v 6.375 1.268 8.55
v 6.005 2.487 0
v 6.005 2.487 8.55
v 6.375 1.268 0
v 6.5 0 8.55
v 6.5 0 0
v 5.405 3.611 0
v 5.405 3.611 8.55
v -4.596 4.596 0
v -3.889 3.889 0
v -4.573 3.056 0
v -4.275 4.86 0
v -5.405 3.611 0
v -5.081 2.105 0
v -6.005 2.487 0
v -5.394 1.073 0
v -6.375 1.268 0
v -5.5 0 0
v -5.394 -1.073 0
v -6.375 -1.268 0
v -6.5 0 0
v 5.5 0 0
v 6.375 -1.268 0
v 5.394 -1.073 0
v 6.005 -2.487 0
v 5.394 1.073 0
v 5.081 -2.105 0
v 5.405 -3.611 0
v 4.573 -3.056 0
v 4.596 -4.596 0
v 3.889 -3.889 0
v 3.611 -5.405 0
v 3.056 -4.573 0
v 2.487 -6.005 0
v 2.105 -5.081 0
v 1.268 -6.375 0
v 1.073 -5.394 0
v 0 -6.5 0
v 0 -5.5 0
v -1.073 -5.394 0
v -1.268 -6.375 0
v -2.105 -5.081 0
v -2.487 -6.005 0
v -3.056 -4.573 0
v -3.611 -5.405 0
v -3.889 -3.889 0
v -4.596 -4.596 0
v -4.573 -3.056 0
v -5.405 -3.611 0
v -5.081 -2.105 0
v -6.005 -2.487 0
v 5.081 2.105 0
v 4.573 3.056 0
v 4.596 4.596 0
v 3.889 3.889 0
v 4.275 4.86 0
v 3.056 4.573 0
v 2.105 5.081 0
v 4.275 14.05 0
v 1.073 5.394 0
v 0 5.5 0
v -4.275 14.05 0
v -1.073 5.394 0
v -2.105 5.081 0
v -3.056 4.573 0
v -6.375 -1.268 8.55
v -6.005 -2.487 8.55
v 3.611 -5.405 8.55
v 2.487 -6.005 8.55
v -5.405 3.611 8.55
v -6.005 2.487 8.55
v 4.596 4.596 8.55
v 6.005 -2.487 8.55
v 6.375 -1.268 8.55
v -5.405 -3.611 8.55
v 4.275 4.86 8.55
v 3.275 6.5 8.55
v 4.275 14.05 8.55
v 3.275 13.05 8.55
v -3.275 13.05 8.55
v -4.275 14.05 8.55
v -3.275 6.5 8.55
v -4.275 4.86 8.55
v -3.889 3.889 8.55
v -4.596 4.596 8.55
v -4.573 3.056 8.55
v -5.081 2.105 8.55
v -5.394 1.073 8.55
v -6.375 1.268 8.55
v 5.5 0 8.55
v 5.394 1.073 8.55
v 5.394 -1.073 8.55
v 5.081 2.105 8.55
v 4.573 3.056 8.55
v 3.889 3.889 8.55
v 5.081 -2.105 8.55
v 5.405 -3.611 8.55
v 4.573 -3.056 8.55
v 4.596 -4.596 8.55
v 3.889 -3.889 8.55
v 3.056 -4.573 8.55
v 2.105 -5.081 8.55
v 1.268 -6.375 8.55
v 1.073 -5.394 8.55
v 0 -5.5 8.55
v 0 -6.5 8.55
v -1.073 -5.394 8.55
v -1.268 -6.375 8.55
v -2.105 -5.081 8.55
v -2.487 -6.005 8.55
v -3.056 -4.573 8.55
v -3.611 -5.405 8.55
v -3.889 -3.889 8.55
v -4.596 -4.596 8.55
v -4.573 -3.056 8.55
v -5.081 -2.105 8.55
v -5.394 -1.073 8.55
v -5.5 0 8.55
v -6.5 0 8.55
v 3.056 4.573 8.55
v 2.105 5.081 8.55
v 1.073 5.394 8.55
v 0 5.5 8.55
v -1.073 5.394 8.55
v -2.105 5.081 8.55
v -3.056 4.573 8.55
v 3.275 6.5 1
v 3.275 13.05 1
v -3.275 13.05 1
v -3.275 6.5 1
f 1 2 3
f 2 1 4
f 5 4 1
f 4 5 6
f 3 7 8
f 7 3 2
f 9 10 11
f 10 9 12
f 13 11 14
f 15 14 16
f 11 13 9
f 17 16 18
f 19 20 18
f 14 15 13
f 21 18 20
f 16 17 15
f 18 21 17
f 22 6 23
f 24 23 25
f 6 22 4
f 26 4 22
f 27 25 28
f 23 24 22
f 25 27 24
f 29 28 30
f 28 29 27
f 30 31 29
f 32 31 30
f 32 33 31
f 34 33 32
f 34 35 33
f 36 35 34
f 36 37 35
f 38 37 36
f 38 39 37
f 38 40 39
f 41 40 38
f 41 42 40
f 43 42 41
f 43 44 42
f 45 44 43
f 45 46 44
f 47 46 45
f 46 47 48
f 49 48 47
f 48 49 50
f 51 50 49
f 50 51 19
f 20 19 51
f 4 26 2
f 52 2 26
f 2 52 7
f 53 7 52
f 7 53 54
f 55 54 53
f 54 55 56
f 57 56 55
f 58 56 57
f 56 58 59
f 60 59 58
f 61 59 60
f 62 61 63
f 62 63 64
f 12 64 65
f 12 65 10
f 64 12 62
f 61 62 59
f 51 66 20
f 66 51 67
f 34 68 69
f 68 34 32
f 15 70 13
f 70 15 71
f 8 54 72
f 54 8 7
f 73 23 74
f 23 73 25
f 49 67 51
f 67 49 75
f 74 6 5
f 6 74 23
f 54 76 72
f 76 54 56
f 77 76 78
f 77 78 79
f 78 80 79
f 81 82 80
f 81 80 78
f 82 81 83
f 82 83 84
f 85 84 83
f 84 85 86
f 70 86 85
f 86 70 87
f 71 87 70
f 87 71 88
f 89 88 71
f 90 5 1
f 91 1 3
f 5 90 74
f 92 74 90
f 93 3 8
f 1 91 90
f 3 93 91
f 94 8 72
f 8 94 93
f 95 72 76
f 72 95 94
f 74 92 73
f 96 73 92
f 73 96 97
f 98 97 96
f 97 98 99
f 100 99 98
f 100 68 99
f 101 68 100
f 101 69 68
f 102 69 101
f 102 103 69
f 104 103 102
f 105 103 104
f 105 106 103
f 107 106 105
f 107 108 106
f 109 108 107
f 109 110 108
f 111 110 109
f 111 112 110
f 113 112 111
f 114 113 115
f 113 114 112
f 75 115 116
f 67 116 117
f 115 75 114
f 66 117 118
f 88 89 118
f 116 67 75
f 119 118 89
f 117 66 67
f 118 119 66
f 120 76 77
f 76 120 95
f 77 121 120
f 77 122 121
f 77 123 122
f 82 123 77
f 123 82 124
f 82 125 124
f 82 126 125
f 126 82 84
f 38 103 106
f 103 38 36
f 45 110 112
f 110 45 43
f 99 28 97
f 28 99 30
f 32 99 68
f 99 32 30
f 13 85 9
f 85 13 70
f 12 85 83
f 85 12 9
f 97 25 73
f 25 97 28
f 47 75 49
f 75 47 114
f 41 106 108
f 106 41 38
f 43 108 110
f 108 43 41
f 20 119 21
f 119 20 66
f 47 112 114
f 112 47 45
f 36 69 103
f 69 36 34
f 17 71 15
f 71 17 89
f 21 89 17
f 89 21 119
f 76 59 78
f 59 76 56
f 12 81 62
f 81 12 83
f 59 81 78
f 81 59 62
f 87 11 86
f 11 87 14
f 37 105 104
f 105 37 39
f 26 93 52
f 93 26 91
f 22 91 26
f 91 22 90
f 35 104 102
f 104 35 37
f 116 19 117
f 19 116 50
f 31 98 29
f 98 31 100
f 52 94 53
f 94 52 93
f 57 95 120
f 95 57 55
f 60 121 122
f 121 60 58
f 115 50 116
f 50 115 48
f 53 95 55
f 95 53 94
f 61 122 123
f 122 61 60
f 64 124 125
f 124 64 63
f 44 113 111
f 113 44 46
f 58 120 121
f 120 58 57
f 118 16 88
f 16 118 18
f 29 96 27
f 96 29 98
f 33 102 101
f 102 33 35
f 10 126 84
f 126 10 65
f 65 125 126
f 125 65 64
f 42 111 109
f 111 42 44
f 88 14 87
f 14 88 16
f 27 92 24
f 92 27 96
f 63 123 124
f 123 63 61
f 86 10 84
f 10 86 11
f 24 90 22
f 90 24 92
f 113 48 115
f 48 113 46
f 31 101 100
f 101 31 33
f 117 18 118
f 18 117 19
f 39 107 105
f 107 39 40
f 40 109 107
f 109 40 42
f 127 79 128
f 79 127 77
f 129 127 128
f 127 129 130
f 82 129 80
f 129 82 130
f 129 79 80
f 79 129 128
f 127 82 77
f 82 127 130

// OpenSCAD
// [FL_INDEX: keywords="openscad, 3d_parametric, Magnetic_Marker_Holder, csg_solid" | COT="Parametric OpenSCAD design from 3DCodeverse"]
// Title: Magnetic Marker Holder

// author: clayb.rpi@gmail.com
// date: 2013-01-27
// units: mm
//
// description: A small plastic piece to hold a magnet cube
//   and a whiteboard marker together.

// The diameter (mm) of the pen to hold. This should be a tight fit.
PEN_DIAMETER = 11;

// The side length (mm) of the magnet cube (assumed to be equal on all sides).
MAGNET_CUBE_SIZE = 6.55;

// The minimum wall thickness (mm).
MIN_WALL_THICKNESS = 1;

// How detailed the print should be.
$fn=32 + 0; // the '+ 0' prevents customizer from displaying this variable.

// The main unit of height
TOTAL_H =  MAGNET_CUBE_SIZE + 2 * MIN_WALL_THICKNESS;

difference() {
  union() {
  	cylinder(r=PEN_DIAMETER/2 + MIN_WALL_THICKNESS, h=MAGNET_CUBE_SIZE + 2 * MIN_WALL_THICKNESS);

    translate([-TOTAL_H / 2, 0, 0])
    cube([TOTAL_H, PEN_DIAMETER / 2 + TOTAL_H, TOTAL_H]);
  }

  // cut away a place for the pen.
  translate([0, 0, -1])
	cylinder(r=PEN_DIAMETER/2, h=MAGNET_CUBE_SIZE + 2 * MIN_WALL_THICKNESS + 2);

  // cut away a place for the magnet.
  translate([-MAGNET_CUBE_SIZE / 2, PEN_DIAMETER /2 + MIN_WALL_THICKNESS, MIN_WALL_THICKNESS])
  cube([MAGNET_CUBE_SIZE,
        MAGNET_CUBE_SIZE,
        MAGNET_CUBE_SIZE + MIN_WALL_THICKNESS + 1]);
}
